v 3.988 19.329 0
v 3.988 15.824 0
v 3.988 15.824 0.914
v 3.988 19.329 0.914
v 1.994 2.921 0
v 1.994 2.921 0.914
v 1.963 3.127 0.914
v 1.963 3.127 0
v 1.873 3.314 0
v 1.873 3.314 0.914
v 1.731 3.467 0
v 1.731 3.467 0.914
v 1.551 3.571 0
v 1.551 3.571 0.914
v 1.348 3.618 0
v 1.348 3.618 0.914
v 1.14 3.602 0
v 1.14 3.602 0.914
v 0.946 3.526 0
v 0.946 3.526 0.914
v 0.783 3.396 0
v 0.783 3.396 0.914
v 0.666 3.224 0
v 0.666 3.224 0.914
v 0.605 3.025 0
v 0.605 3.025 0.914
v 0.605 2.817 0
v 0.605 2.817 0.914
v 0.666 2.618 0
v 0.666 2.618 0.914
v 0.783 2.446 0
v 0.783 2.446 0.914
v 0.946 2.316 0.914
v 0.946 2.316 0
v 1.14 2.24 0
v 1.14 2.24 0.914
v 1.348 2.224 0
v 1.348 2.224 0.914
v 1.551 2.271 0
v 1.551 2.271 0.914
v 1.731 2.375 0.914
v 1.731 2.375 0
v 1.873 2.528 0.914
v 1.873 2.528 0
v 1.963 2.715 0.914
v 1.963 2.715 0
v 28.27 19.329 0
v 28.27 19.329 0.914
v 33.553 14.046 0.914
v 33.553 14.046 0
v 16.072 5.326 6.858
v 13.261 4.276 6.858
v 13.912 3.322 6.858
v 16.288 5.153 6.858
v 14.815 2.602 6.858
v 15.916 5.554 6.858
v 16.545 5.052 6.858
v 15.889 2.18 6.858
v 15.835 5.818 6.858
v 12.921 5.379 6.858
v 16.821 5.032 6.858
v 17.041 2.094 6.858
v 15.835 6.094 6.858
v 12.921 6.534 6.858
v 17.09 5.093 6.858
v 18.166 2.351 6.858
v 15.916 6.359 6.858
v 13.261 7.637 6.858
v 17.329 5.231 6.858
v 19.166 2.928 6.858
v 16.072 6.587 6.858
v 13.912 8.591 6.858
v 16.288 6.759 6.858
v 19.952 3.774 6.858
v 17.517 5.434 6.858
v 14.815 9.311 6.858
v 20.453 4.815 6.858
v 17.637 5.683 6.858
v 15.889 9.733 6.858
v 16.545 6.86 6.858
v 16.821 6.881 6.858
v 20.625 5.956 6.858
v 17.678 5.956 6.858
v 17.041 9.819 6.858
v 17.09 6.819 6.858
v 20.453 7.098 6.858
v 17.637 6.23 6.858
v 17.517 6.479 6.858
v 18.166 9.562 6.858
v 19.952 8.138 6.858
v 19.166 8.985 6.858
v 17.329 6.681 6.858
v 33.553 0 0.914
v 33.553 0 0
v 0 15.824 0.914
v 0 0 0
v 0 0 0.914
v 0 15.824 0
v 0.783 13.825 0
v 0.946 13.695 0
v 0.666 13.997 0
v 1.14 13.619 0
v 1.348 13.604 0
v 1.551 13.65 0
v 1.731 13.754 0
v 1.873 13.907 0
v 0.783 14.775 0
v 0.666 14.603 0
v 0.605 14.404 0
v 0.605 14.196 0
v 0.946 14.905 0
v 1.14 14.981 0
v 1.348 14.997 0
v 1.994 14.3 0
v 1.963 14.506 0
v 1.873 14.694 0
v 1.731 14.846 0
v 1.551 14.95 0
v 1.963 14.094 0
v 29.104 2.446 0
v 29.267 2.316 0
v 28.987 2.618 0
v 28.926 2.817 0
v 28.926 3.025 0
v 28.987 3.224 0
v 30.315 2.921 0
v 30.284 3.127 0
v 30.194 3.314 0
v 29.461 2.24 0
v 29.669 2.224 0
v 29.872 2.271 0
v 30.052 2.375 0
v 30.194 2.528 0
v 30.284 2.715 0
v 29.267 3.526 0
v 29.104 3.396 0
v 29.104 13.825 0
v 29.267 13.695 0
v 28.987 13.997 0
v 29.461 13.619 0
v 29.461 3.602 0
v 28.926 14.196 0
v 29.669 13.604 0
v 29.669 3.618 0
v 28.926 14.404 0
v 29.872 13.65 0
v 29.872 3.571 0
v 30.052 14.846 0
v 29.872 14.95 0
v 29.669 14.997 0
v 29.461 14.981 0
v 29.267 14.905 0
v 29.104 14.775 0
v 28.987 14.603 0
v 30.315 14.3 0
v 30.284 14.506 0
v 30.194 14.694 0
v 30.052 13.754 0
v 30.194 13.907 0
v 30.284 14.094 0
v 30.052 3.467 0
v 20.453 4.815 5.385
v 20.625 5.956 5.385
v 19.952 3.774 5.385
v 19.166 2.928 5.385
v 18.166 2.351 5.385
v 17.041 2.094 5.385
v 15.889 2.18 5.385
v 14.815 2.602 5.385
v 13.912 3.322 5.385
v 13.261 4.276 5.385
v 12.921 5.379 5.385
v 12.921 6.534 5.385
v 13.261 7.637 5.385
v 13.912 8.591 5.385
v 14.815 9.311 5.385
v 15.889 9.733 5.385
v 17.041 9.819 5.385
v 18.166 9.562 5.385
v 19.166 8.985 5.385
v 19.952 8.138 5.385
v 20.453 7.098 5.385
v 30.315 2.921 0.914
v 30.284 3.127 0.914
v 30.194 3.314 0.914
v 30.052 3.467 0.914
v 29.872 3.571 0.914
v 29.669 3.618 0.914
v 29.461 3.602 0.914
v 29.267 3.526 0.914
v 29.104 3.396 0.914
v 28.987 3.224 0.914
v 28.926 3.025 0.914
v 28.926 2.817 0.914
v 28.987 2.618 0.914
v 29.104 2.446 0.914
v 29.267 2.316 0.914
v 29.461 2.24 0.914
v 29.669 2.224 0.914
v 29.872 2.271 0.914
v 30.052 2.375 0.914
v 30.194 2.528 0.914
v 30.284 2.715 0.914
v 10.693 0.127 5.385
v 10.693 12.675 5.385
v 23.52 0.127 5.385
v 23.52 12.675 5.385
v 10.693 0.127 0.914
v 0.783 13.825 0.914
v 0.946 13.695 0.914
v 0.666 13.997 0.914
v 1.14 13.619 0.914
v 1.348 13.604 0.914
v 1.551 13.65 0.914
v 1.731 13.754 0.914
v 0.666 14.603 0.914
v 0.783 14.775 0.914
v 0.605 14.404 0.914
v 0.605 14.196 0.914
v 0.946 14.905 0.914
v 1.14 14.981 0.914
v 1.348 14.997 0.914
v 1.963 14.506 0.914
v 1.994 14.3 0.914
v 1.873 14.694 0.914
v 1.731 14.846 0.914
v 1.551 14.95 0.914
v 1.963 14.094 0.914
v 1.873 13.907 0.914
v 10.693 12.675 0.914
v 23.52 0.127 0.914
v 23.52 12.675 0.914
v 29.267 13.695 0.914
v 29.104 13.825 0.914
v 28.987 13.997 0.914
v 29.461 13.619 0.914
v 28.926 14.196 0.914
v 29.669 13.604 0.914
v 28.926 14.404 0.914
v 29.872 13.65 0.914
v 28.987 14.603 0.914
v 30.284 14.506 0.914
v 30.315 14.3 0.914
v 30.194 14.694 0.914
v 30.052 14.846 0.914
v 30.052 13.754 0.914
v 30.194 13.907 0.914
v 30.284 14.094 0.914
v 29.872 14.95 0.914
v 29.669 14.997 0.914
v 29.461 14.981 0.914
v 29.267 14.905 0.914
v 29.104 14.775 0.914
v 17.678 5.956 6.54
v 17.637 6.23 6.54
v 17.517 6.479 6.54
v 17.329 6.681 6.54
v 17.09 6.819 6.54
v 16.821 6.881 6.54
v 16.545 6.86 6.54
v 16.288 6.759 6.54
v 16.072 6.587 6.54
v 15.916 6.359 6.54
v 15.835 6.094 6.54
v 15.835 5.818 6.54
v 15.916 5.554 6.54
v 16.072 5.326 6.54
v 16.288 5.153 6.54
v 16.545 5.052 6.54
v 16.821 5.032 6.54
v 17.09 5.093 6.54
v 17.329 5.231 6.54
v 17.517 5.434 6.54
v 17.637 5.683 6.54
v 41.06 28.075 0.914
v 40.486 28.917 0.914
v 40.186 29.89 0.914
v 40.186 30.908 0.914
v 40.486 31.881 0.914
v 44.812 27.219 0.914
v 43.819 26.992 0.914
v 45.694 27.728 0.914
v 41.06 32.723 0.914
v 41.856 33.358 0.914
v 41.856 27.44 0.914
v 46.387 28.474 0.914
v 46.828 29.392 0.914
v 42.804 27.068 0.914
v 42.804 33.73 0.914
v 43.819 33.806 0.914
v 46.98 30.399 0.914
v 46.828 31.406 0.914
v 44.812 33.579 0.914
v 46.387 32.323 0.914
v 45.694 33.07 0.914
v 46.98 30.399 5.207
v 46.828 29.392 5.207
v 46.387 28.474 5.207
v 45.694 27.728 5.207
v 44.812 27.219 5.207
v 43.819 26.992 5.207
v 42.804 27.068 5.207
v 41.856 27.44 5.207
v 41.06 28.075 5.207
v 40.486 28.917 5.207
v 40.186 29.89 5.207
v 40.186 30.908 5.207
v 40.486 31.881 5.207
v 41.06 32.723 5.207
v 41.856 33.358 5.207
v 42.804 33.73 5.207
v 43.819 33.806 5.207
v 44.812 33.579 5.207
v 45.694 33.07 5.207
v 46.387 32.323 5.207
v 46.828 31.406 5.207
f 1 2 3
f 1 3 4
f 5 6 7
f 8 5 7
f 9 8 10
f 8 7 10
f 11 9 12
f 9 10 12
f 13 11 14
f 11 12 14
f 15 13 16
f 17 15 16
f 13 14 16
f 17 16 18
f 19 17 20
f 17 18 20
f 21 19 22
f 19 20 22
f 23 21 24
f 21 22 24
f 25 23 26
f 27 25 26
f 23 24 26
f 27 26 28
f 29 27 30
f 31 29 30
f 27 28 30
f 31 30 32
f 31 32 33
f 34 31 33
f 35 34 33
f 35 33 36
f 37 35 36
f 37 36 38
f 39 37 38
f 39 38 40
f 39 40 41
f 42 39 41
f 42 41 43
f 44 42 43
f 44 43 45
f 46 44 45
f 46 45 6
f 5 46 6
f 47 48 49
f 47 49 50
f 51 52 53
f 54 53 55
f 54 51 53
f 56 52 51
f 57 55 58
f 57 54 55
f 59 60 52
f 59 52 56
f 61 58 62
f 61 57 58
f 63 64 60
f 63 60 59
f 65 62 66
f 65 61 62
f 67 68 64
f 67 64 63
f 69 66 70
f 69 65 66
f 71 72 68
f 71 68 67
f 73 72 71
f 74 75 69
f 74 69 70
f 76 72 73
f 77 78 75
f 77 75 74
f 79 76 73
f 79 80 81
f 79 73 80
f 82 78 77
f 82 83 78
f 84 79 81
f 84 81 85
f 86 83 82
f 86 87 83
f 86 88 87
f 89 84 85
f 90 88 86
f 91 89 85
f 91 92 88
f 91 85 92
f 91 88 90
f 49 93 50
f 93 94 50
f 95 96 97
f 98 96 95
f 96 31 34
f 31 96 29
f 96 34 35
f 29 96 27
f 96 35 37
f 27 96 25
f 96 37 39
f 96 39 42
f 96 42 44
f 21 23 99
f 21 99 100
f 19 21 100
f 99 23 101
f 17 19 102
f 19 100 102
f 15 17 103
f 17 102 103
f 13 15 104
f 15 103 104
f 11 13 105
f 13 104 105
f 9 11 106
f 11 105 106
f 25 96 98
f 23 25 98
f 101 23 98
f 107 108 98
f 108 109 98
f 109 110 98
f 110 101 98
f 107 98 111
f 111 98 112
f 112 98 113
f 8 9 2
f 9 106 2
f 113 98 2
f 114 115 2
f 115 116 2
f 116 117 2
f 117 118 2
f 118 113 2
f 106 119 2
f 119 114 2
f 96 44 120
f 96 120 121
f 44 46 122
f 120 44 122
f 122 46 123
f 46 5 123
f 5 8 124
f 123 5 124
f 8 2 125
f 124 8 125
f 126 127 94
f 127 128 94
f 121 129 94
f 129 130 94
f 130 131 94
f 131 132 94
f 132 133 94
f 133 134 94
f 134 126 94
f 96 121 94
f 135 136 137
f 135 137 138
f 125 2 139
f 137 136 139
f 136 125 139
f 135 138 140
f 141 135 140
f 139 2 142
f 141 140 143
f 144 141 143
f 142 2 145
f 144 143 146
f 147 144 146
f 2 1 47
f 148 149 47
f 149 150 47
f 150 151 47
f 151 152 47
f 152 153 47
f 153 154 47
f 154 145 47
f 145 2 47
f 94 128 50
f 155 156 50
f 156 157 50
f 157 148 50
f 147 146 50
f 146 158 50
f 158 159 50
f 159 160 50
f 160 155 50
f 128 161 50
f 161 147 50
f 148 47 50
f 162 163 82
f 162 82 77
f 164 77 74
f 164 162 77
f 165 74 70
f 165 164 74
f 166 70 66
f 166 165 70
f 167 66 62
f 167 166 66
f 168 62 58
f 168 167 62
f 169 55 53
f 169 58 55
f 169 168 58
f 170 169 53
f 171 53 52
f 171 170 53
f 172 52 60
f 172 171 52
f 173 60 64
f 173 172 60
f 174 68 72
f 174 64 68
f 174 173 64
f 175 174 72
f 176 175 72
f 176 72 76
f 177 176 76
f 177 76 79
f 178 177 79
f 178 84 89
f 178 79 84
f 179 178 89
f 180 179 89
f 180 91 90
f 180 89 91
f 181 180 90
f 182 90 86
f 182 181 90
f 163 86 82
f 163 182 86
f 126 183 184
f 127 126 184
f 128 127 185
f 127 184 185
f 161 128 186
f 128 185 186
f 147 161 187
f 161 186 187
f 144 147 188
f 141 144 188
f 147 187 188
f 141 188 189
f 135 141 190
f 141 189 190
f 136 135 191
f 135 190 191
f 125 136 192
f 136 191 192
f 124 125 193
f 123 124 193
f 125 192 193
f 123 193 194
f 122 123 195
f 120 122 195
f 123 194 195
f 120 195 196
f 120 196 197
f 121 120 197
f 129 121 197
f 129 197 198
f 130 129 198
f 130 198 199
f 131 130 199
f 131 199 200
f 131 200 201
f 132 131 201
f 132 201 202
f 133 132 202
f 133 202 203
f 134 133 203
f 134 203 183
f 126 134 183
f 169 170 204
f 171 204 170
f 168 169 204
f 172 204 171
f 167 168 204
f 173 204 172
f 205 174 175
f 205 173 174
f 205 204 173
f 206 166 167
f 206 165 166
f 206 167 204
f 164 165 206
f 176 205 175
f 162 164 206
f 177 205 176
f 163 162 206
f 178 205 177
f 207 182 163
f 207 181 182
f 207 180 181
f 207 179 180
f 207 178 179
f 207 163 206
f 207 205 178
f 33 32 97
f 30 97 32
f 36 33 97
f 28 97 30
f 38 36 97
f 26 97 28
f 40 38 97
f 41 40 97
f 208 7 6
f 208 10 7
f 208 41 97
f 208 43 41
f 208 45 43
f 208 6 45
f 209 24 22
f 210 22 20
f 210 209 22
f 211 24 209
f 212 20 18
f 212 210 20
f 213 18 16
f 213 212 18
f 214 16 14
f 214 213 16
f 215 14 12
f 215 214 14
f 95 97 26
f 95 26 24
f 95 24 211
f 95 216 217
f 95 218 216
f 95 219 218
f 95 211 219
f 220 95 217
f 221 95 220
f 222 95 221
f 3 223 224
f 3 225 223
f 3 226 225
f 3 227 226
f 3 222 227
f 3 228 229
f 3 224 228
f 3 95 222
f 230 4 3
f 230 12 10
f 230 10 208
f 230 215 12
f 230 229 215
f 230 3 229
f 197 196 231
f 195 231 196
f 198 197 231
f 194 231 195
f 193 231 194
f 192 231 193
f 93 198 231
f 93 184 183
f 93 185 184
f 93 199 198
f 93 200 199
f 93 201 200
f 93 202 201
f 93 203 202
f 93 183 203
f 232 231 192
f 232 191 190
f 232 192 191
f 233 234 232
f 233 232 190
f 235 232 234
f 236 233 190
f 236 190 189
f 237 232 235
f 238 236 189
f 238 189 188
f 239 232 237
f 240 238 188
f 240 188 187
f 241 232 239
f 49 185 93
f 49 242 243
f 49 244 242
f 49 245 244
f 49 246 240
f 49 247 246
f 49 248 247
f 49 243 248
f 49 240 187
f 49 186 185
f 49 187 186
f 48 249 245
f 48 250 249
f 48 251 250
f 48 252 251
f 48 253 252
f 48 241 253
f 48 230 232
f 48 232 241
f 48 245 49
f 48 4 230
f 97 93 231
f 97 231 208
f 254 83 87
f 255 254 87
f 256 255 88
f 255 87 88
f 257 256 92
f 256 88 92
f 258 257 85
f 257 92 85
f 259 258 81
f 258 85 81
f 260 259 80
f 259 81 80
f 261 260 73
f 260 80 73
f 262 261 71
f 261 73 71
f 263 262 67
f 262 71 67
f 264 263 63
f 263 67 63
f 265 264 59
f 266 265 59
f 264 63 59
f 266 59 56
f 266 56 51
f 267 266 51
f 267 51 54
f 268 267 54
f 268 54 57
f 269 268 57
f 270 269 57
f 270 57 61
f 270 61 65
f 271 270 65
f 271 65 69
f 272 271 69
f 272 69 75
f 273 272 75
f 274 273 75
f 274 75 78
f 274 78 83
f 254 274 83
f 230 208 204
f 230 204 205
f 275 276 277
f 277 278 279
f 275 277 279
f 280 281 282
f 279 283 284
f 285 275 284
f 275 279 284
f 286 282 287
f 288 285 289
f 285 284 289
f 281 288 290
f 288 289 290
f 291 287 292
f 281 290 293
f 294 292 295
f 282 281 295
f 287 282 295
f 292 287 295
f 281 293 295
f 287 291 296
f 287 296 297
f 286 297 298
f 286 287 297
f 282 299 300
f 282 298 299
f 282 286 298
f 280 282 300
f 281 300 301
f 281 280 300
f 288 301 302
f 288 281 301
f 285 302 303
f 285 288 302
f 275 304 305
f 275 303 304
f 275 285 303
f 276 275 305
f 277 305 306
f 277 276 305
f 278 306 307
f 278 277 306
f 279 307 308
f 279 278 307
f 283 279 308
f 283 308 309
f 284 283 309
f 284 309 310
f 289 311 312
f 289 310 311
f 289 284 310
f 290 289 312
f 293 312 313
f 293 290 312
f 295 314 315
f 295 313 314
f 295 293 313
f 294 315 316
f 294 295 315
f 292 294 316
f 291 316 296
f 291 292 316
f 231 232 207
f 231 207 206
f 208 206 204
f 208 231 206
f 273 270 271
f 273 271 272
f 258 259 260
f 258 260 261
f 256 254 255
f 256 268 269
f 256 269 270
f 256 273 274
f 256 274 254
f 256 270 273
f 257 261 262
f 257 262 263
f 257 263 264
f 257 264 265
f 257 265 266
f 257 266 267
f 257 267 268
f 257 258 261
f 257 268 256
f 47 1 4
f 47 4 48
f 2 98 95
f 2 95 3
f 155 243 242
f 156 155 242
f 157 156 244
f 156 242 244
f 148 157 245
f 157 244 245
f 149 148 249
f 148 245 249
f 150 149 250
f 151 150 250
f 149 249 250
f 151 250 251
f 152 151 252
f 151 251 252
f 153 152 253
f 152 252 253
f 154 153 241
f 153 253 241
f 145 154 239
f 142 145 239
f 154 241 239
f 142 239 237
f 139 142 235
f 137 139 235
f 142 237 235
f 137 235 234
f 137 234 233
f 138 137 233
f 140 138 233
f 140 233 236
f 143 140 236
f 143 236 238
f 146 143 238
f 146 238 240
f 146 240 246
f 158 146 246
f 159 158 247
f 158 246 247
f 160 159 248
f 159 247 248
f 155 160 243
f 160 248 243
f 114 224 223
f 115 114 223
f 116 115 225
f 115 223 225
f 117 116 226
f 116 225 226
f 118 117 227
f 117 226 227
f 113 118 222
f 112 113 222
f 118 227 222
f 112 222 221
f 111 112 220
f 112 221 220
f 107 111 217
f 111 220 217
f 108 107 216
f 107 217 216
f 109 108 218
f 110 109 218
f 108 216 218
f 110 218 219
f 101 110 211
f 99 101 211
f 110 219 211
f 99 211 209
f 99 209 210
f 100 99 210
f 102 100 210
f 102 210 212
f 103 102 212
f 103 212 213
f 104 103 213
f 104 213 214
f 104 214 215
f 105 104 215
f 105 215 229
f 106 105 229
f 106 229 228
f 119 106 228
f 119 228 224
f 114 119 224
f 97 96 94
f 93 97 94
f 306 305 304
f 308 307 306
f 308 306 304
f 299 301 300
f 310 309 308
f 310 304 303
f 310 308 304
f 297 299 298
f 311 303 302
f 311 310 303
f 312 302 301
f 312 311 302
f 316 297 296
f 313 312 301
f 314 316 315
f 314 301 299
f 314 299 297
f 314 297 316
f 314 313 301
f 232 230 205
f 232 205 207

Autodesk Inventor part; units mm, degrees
ref_plane "YZ Plane" through (0, 0, 0) normal (1, 0, 0) x (0, 1, 0)
ref_plane "XZ Plane" through (0, 0, 0) normal (0, 1, 0) x (-1, 0, 0)
ref_plane "XY Plane" through (0, 0, 0) normal (0, 0, 1) x (1, 0, 0)
sketch "Sketch1" plane through (0, 0, 0) normal (0, 0, 1) x (1, 0, 0)
  line L0 (0, 0) -> (33.5534, 0)
  line L1 (33.5534, 0) -> (33.5534, 19.3294)
  line L2 (0, 0) -> (0, 15.8242)
  line L3 (0, 15.8242) -> (3.9878, 15.8242)
  line L4 (3.9878, 15.8242) -> (3.9878, 19.3294)
  line L5 (3.9878, 19.3294) -> (33.5534, 19.3294)
  dimension "d0" = 33.5534
  dimension "d2" = 15.8242
  dimension "d3" = 3.9878
  dimension "d4" = 3.5052
extrude "Extrusion1" add sketch "Sketch1" along normal blind 0.9144
chamfer "Chamfer1" distance 5.2832 angle 45 1 edges at (33.5534, 19.3294, 0.4572)
sketch "Sketch2" plane through (0, 0, 0.9144) normal (0, 0, 1) x (1, 0, 0)
  line L0 (10.6934, 12.6746) -> (23.5204, 12.6746)
  line L1 (23.5204, 12.6746) -> (23.5204, 0.127)
  line L2 (23.5204, 0.127) -> (10.6934, 0.127)
  line L3 (10.6934, 0.127) -> (10.6934, 12.6746)
  line L4 (0, 15.8242) -> (0, 0) projected
  line L5 (28.2702, 19.3294) -> (3.9878, 19.3294) projected
  dimension "d11" = 12.5476
  dimension "d12" = 12.827
  dimension "d13" = 10.6934
  dimension "d14" = 6.6548
extrude "Extrusion2" add sketch "Sketch2" along normal blind 4.4704
sketch "Sketch3" plane through (0, 0, 5.3848) normal (0, 0, 1) x (1, 0, 0)
  circle A0 centre (16.7513, 5.9563) radius 3.8735
  line L0 (23.5204, 12.6746) -> (10.6934, 12.6746) projected
  line L1 (23.5204, 12.6746) -> (10.6934, 12.6746) projected
  line L2 (10.6934, 12.6746) -> (10.6934, 0.127) projected
  line L3 (10.6934, 0.127) -> (23.5204, 0.127) projected
  line L4 (23.5204, 0.127) -> (23.5204, 12.6746) projected
  point P0 (0, 0)
  dimension "d17" = 7.747
  dimension "d18" = 2.8448
  dimension "d19" = 2.1844
extrude "Extrusion3" add sketch "Sketch3" along normal blind 1.4732 contours A0
sketch "Sketch4" plane through (16.7513, 5.9563, 6.858) normal (0, 0, 1) x (1, 0, 0)
  circle A0 centre (0, 0) radius 0.9271
  circle A1 centre (0, 0) radius 3.8735 projected
  point P0 (-16.7513, -5.9563)
  dimension "d22" = 1.8542
sketch "Sketch5" plane through (0, 0, 0.9144) normal (0, 0, 1) x (1, 0, 0)
  circle A0 centre (1.2954, 14.3002) radius 0.6985
  line L0 (0, 15.8242) -> (0, 0) projected
  line L1 (3.9878, 15.8242) -> (0, 15.8242) projected
  dimension "d25" = 1.397
  dimension "d26" = 1.2954
  dimension "d27" = 1.524
extrude "Extrusion4" cut sketch "Sketch5" against normal through all
pattern_linear "Rectangular Pattern1" count 2 spacing 28.321 along (1, 0, 0) count 2 spacing 11.3792 along (0, -1, 0) of "Extrusion4"
sketch "Sketch6" plane through (0, 0, 0.9144) normal (0, 0, 1) x (1, 0, 0)
  circle A0 centre (43.5639, 30.3989) radius 3.4163
  circle A1 centre (29.6164, 14.3002) radius 0.6985 projected
  line L0 (41.7156, 36.5328) -> (55.0845, 24.9094) construction
  line L1 (34.1294, 34.0359) -> (52.5388, 18.129) construction
  point P0 (0, 0)
  point P1 (27.6891, 12.6669)
  dimension "d36" = 6.8326
extrude "Extrusion5" add sketch "Sketch6" along normal blind 4.2926 contours A0
extrude "Extrusion13" cut sketch "Sketch4" against normal blind 0.3175 contours A0
ref_plane "Work Plane2" through (16.7513, 5.9563, 6.858) normal (0, -1, 0) x (0, 0, -1)
ref_plane "Work Plane1" through (16.7513, 5.9563, 6.858) normal (1, 0, 0) x (0, 0, -1)
properties part number "Camera"
